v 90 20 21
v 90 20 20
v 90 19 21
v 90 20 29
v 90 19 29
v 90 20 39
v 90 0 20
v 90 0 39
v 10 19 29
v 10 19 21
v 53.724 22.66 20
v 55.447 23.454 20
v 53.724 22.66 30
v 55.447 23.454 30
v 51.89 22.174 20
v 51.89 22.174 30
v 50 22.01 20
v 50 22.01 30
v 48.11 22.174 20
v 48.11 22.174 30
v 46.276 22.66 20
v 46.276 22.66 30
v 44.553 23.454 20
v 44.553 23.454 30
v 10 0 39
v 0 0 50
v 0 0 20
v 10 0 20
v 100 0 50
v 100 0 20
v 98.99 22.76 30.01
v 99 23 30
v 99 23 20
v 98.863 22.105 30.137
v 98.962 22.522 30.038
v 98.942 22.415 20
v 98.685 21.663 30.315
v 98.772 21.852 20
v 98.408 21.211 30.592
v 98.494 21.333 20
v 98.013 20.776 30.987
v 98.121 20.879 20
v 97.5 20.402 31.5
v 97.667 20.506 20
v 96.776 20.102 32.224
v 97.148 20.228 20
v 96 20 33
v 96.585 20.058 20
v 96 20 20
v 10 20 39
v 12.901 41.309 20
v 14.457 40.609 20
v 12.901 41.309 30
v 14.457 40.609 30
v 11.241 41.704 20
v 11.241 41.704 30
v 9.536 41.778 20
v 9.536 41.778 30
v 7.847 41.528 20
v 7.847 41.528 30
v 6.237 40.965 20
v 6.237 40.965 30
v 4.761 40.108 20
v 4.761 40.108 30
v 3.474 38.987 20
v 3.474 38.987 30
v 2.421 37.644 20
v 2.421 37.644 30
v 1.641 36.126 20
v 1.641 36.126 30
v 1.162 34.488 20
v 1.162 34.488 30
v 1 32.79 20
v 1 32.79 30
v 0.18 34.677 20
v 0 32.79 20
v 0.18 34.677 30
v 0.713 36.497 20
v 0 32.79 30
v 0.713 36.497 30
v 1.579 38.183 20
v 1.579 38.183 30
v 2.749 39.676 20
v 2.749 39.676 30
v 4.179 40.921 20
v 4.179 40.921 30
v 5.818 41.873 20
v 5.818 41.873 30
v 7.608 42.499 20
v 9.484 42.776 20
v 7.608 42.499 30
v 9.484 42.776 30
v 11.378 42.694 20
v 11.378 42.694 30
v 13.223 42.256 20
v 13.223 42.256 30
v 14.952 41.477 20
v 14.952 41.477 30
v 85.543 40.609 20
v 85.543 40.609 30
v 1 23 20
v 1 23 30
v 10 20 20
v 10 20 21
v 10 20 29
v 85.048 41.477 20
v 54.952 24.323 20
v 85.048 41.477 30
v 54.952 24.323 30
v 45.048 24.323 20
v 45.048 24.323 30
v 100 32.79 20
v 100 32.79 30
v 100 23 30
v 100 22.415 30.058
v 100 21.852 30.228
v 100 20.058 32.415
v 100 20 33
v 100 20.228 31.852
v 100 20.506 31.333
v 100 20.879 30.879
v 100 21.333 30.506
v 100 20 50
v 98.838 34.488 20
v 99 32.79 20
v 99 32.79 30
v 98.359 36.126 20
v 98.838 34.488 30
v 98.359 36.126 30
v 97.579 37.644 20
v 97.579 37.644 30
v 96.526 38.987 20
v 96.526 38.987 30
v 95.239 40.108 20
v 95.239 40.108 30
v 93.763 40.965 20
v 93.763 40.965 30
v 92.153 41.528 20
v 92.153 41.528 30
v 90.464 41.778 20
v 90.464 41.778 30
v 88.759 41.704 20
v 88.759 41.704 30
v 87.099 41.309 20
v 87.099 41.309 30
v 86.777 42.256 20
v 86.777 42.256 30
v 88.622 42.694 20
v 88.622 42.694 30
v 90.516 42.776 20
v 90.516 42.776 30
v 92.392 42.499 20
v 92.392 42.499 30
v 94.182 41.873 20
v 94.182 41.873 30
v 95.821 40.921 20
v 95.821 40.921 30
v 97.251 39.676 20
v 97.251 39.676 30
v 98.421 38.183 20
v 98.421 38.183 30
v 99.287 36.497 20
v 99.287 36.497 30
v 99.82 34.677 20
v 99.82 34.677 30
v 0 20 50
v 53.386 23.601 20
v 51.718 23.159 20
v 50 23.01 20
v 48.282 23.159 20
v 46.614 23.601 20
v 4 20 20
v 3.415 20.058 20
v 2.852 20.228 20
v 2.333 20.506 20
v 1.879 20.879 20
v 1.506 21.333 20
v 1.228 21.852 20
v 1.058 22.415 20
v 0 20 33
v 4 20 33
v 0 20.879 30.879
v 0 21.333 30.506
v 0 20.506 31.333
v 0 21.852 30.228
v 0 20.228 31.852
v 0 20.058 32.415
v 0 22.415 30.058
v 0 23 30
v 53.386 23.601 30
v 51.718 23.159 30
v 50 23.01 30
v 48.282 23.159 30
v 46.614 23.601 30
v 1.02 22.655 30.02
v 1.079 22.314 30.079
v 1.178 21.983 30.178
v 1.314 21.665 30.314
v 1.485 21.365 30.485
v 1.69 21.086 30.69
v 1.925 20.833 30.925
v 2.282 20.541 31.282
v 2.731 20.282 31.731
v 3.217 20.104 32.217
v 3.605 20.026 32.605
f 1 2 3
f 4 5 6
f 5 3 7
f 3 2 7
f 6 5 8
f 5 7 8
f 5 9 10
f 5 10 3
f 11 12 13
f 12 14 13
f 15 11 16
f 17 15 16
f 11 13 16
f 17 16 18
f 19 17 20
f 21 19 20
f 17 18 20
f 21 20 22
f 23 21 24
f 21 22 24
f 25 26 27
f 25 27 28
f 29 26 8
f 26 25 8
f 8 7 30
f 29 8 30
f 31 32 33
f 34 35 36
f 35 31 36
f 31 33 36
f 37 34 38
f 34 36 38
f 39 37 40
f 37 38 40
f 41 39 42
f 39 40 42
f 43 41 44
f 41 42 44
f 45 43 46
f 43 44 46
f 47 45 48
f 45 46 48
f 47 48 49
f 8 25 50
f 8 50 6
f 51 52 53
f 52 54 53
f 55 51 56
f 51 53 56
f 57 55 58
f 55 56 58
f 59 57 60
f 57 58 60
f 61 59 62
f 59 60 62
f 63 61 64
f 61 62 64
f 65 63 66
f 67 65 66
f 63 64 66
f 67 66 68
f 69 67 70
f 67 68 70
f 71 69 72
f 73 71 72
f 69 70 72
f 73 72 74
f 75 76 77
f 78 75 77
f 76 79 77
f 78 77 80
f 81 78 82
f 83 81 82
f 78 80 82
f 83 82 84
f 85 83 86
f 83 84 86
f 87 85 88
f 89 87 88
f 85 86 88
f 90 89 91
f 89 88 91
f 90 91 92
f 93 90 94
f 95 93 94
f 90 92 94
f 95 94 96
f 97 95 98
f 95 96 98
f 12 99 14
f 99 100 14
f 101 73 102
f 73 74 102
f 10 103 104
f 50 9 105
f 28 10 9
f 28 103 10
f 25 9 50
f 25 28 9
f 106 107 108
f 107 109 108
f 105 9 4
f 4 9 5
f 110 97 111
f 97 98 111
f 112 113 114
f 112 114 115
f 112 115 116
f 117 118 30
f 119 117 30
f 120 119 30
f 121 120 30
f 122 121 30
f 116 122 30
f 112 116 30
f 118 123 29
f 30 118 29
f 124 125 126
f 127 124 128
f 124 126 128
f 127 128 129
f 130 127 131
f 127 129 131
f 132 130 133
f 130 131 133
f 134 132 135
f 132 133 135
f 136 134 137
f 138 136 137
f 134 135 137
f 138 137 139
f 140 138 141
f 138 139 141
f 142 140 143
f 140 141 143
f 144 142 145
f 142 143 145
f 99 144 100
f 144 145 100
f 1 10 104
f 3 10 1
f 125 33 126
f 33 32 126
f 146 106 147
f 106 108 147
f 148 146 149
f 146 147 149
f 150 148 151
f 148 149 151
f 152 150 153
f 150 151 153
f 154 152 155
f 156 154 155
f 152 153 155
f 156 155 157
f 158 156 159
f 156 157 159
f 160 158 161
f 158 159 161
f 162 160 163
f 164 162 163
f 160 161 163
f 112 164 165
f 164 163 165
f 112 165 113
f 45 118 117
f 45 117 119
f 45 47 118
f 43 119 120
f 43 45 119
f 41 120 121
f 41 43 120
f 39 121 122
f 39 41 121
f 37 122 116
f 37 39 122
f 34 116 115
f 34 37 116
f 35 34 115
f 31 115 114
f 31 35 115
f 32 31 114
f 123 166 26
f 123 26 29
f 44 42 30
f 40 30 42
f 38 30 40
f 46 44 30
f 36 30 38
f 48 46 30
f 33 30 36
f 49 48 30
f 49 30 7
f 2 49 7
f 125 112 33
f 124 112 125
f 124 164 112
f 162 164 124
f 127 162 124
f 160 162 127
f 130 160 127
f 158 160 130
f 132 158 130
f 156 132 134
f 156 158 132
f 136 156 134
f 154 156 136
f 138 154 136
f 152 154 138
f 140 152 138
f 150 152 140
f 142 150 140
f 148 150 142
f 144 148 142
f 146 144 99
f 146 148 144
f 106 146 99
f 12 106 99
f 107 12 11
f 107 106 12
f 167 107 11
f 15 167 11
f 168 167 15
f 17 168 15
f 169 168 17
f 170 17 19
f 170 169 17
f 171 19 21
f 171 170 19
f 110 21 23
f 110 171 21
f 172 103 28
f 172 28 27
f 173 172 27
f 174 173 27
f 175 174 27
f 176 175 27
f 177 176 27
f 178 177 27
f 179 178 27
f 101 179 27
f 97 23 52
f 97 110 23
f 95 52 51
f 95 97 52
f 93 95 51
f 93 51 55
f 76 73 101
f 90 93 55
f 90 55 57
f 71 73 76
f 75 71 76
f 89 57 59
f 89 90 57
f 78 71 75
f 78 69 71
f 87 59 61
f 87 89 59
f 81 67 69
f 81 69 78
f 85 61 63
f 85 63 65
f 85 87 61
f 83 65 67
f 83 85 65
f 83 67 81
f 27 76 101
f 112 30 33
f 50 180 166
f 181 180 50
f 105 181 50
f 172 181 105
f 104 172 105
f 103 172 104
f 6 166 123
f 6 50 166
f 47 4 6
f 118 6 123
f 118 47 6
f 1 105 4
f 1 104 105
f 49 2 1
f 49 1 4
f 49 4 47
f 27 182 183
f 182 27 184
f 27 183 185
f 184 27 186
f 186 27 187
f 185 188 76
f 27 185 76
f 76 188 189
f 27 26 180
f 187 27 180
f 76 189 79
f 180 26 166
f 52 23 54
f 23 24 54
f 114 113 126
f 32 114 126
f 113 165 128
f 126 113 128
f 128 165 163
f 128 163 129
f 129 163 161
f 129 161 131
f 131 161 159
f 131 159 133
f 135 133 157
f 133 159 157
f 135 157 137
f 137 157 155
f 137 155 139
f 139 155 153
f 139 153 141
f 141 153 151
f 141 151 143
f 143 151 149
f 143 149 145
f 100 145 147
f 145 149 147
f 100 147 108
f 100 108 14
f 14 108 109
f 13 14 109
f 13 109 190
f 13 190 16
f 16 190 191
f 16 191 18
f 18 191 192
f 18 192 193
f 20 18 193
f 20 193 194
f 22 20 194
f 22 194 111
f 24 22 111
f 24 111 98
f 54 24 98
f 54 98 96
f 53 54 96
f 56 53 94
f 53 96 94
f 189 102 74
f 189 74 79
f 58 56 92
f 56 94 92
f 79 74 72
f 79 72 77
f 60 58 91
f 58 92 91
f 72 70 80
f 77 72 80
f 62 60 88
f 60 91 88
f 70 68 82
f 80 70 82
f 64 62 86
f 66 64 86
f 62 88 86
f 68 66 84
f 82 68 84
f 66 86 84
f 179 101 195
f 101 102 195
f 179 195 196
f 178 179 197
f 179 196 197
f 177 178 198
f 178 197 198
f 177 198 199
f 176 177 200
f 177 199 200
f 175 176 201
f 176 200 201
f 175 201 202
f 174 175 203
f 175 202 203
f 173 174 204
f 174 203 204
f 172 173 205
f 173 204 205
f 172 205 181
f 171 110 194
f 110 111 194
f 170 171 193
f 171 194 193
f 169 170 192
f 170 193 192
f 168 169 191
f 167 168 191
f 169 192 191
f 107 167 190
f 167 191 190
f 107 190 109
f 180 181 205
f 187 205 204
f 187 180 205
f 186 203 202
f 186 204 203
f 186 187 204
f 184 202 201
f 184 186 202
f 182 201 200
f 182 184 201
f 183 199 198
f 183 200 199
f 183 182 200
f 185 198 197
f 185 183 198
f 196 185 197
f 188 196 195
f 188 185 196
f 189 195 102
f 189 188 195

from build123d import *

# Parameters (mm, degrees)
SKIZZE1_W                         = 100
SKIZZE1_H                         = 20
AUFSATZ_LINEAR_AUSTRAGEN1_DEPTH   = 50
SKIZZE3_W                         = 80
SKIZZE3_H                         = 10
SCHNITT_LINEAR_AUSTRAGEN1_DEPTH   = 21
SKIZZE4_W                         = 80
SKIZZE4_H                         = 18
SCHNITT_LINEAR_AUSTRAGEN2_DEPTH   = 19
LINEAR_AUSTRAGEN_D_NN1_DEPTH      = 5
LINEAR_AUSTRAGEN_D_NN1_DEPTH_BACK = 5
SKIZZE5_W                         = 100
SKIZZE5_H                         = 20
SCHNITT_LINEAR_AUSTRAGEN3_DEPTH   = 20
VERRUNDUNG1_R                     = 3


with BuildPart() as part:
    # Skizze1 → Aufsatz-Linear austragen1 (new body)
    with BuildSketch(Plane.XY):
        with Locations((50, 10)):
            Rectangle(SKIZZE1_W, SKIZZE1_H)
    extrude(amount=AUFSATZ_LINEAR_AUSTRAGEN1_DEPTH)

    # Skizze3 → Schnitt-Linear austragen1 (cut, through all)
    with BuildSketch(Plane.XZ):
        with Locations((50, 34)):
            Rectangle(SKIZZE3_W, SKIZZE3_H)
        with Locations((50, 16)):
            Rectangle(SKIZZE3_W, SKIZZE3_H)
    extrude(amount=-SCHNITT_LINEAR_AUSTRAGEN1_DEPTH, mode=Mode.SUBTRACT)

    # Skizze4 → Schnitt-Linear austragen2 (cut)
    with BuildSketch(Plane.XZ):
        with Locations((50, 25)):
            Rectangle(SKIZZE4_W, SKIZZE4_H)
    extrude(amount=-SCHNITT_LINEAR_AUSTRAGEN2_DEPTH, mode=Mode.SUBTRACT)

    # Skizze2 → Linear-Austragen-Dünn1 (add, two sides)
    with BuildSketch(Plane.XY.offset(25)) as linear_austragen_d_nn1_sk:
        with BuildLine():
            Line((0, 20), (0, 32.789569947))
            ThreePointArc((0, 32.789569947), (4.976072473, 41.435965277), (14.95203044, 41.477342649))
            Line((14.95203044, 41.477342649), (45.04796956, 24.322657351))
            ThreePointArc((45.04796956, 24.322657351), (50, 23.010430053), (54.95203044, 24.322657351))
            Line((54.95203044, 24.322657351), (85.04796956, 41.477342649))
            ThreePointArc((85.04796956, 41.477342649), (95.023927527, 41.435965277), (100, 32.789569947))
            Line((100, 32.789569947), (100, 20))
            Line((100, 20), (99, 20))
            Line((99, 20), (99, 32.789569947))
            ThreePointArc((99, 32.789569947), (94.521534775, 40.571325744), (85.543172604, 40.608565379))
            Line((85.543172604, 40.608565379), (55.447233484, 23.453880081))
            ThreePointArc((55.447233484, 23.453880081), (50, 22.010430053), (44.552766516, 23.453880081))
            Line((44.552766516, 23.453880081), (14.456827396, 40.608565379))
            ThreePointArc((14.456827396, 40.608565379), (5.478465225, 40.571325744), (1, 32.789569947))
            Line((1, 32.789569947), (1, 20))
            Line((1, 20), (0, 20))
        make_face()
    extrude(amount=LINEAR_AUSTRAGEN_D_NN1_DEPTH)
    extrude(linear_austragen_d_nn1_sk.sketch, amount=-LINEAR_AUSTRAGEN_D_NN1_DEPTH_BACK)

    # Skizze5 → Schnitt-Linear austragen3 (cut)
    with BuildSketch(Plane(origin=(0, 0, 0), x_dir=(-1, 0, 0), z_dir=(0, 0, -1))):
        with Locations((-50, 10)):
            Rectangle(SKIZZE5_W, SKIZZE5_H)
    extrude(amount=-SCHNITT_LINEAR_AUSTRAGEN3_DEPTH, mode=Mode.SUBTRACT)

    # Verrundung1
    verrundung1_edges = [part.edges().sort_by_distance(p)[0] for p in [
        (99.5, 20, 30),
        (99, 20, 25),
        (1, 20, 25),
        (0.5, 20, 30),
    ]]
    fillet(verrundung1_edges, radius=VERRUNDUNG1_R)


solid = part.part
